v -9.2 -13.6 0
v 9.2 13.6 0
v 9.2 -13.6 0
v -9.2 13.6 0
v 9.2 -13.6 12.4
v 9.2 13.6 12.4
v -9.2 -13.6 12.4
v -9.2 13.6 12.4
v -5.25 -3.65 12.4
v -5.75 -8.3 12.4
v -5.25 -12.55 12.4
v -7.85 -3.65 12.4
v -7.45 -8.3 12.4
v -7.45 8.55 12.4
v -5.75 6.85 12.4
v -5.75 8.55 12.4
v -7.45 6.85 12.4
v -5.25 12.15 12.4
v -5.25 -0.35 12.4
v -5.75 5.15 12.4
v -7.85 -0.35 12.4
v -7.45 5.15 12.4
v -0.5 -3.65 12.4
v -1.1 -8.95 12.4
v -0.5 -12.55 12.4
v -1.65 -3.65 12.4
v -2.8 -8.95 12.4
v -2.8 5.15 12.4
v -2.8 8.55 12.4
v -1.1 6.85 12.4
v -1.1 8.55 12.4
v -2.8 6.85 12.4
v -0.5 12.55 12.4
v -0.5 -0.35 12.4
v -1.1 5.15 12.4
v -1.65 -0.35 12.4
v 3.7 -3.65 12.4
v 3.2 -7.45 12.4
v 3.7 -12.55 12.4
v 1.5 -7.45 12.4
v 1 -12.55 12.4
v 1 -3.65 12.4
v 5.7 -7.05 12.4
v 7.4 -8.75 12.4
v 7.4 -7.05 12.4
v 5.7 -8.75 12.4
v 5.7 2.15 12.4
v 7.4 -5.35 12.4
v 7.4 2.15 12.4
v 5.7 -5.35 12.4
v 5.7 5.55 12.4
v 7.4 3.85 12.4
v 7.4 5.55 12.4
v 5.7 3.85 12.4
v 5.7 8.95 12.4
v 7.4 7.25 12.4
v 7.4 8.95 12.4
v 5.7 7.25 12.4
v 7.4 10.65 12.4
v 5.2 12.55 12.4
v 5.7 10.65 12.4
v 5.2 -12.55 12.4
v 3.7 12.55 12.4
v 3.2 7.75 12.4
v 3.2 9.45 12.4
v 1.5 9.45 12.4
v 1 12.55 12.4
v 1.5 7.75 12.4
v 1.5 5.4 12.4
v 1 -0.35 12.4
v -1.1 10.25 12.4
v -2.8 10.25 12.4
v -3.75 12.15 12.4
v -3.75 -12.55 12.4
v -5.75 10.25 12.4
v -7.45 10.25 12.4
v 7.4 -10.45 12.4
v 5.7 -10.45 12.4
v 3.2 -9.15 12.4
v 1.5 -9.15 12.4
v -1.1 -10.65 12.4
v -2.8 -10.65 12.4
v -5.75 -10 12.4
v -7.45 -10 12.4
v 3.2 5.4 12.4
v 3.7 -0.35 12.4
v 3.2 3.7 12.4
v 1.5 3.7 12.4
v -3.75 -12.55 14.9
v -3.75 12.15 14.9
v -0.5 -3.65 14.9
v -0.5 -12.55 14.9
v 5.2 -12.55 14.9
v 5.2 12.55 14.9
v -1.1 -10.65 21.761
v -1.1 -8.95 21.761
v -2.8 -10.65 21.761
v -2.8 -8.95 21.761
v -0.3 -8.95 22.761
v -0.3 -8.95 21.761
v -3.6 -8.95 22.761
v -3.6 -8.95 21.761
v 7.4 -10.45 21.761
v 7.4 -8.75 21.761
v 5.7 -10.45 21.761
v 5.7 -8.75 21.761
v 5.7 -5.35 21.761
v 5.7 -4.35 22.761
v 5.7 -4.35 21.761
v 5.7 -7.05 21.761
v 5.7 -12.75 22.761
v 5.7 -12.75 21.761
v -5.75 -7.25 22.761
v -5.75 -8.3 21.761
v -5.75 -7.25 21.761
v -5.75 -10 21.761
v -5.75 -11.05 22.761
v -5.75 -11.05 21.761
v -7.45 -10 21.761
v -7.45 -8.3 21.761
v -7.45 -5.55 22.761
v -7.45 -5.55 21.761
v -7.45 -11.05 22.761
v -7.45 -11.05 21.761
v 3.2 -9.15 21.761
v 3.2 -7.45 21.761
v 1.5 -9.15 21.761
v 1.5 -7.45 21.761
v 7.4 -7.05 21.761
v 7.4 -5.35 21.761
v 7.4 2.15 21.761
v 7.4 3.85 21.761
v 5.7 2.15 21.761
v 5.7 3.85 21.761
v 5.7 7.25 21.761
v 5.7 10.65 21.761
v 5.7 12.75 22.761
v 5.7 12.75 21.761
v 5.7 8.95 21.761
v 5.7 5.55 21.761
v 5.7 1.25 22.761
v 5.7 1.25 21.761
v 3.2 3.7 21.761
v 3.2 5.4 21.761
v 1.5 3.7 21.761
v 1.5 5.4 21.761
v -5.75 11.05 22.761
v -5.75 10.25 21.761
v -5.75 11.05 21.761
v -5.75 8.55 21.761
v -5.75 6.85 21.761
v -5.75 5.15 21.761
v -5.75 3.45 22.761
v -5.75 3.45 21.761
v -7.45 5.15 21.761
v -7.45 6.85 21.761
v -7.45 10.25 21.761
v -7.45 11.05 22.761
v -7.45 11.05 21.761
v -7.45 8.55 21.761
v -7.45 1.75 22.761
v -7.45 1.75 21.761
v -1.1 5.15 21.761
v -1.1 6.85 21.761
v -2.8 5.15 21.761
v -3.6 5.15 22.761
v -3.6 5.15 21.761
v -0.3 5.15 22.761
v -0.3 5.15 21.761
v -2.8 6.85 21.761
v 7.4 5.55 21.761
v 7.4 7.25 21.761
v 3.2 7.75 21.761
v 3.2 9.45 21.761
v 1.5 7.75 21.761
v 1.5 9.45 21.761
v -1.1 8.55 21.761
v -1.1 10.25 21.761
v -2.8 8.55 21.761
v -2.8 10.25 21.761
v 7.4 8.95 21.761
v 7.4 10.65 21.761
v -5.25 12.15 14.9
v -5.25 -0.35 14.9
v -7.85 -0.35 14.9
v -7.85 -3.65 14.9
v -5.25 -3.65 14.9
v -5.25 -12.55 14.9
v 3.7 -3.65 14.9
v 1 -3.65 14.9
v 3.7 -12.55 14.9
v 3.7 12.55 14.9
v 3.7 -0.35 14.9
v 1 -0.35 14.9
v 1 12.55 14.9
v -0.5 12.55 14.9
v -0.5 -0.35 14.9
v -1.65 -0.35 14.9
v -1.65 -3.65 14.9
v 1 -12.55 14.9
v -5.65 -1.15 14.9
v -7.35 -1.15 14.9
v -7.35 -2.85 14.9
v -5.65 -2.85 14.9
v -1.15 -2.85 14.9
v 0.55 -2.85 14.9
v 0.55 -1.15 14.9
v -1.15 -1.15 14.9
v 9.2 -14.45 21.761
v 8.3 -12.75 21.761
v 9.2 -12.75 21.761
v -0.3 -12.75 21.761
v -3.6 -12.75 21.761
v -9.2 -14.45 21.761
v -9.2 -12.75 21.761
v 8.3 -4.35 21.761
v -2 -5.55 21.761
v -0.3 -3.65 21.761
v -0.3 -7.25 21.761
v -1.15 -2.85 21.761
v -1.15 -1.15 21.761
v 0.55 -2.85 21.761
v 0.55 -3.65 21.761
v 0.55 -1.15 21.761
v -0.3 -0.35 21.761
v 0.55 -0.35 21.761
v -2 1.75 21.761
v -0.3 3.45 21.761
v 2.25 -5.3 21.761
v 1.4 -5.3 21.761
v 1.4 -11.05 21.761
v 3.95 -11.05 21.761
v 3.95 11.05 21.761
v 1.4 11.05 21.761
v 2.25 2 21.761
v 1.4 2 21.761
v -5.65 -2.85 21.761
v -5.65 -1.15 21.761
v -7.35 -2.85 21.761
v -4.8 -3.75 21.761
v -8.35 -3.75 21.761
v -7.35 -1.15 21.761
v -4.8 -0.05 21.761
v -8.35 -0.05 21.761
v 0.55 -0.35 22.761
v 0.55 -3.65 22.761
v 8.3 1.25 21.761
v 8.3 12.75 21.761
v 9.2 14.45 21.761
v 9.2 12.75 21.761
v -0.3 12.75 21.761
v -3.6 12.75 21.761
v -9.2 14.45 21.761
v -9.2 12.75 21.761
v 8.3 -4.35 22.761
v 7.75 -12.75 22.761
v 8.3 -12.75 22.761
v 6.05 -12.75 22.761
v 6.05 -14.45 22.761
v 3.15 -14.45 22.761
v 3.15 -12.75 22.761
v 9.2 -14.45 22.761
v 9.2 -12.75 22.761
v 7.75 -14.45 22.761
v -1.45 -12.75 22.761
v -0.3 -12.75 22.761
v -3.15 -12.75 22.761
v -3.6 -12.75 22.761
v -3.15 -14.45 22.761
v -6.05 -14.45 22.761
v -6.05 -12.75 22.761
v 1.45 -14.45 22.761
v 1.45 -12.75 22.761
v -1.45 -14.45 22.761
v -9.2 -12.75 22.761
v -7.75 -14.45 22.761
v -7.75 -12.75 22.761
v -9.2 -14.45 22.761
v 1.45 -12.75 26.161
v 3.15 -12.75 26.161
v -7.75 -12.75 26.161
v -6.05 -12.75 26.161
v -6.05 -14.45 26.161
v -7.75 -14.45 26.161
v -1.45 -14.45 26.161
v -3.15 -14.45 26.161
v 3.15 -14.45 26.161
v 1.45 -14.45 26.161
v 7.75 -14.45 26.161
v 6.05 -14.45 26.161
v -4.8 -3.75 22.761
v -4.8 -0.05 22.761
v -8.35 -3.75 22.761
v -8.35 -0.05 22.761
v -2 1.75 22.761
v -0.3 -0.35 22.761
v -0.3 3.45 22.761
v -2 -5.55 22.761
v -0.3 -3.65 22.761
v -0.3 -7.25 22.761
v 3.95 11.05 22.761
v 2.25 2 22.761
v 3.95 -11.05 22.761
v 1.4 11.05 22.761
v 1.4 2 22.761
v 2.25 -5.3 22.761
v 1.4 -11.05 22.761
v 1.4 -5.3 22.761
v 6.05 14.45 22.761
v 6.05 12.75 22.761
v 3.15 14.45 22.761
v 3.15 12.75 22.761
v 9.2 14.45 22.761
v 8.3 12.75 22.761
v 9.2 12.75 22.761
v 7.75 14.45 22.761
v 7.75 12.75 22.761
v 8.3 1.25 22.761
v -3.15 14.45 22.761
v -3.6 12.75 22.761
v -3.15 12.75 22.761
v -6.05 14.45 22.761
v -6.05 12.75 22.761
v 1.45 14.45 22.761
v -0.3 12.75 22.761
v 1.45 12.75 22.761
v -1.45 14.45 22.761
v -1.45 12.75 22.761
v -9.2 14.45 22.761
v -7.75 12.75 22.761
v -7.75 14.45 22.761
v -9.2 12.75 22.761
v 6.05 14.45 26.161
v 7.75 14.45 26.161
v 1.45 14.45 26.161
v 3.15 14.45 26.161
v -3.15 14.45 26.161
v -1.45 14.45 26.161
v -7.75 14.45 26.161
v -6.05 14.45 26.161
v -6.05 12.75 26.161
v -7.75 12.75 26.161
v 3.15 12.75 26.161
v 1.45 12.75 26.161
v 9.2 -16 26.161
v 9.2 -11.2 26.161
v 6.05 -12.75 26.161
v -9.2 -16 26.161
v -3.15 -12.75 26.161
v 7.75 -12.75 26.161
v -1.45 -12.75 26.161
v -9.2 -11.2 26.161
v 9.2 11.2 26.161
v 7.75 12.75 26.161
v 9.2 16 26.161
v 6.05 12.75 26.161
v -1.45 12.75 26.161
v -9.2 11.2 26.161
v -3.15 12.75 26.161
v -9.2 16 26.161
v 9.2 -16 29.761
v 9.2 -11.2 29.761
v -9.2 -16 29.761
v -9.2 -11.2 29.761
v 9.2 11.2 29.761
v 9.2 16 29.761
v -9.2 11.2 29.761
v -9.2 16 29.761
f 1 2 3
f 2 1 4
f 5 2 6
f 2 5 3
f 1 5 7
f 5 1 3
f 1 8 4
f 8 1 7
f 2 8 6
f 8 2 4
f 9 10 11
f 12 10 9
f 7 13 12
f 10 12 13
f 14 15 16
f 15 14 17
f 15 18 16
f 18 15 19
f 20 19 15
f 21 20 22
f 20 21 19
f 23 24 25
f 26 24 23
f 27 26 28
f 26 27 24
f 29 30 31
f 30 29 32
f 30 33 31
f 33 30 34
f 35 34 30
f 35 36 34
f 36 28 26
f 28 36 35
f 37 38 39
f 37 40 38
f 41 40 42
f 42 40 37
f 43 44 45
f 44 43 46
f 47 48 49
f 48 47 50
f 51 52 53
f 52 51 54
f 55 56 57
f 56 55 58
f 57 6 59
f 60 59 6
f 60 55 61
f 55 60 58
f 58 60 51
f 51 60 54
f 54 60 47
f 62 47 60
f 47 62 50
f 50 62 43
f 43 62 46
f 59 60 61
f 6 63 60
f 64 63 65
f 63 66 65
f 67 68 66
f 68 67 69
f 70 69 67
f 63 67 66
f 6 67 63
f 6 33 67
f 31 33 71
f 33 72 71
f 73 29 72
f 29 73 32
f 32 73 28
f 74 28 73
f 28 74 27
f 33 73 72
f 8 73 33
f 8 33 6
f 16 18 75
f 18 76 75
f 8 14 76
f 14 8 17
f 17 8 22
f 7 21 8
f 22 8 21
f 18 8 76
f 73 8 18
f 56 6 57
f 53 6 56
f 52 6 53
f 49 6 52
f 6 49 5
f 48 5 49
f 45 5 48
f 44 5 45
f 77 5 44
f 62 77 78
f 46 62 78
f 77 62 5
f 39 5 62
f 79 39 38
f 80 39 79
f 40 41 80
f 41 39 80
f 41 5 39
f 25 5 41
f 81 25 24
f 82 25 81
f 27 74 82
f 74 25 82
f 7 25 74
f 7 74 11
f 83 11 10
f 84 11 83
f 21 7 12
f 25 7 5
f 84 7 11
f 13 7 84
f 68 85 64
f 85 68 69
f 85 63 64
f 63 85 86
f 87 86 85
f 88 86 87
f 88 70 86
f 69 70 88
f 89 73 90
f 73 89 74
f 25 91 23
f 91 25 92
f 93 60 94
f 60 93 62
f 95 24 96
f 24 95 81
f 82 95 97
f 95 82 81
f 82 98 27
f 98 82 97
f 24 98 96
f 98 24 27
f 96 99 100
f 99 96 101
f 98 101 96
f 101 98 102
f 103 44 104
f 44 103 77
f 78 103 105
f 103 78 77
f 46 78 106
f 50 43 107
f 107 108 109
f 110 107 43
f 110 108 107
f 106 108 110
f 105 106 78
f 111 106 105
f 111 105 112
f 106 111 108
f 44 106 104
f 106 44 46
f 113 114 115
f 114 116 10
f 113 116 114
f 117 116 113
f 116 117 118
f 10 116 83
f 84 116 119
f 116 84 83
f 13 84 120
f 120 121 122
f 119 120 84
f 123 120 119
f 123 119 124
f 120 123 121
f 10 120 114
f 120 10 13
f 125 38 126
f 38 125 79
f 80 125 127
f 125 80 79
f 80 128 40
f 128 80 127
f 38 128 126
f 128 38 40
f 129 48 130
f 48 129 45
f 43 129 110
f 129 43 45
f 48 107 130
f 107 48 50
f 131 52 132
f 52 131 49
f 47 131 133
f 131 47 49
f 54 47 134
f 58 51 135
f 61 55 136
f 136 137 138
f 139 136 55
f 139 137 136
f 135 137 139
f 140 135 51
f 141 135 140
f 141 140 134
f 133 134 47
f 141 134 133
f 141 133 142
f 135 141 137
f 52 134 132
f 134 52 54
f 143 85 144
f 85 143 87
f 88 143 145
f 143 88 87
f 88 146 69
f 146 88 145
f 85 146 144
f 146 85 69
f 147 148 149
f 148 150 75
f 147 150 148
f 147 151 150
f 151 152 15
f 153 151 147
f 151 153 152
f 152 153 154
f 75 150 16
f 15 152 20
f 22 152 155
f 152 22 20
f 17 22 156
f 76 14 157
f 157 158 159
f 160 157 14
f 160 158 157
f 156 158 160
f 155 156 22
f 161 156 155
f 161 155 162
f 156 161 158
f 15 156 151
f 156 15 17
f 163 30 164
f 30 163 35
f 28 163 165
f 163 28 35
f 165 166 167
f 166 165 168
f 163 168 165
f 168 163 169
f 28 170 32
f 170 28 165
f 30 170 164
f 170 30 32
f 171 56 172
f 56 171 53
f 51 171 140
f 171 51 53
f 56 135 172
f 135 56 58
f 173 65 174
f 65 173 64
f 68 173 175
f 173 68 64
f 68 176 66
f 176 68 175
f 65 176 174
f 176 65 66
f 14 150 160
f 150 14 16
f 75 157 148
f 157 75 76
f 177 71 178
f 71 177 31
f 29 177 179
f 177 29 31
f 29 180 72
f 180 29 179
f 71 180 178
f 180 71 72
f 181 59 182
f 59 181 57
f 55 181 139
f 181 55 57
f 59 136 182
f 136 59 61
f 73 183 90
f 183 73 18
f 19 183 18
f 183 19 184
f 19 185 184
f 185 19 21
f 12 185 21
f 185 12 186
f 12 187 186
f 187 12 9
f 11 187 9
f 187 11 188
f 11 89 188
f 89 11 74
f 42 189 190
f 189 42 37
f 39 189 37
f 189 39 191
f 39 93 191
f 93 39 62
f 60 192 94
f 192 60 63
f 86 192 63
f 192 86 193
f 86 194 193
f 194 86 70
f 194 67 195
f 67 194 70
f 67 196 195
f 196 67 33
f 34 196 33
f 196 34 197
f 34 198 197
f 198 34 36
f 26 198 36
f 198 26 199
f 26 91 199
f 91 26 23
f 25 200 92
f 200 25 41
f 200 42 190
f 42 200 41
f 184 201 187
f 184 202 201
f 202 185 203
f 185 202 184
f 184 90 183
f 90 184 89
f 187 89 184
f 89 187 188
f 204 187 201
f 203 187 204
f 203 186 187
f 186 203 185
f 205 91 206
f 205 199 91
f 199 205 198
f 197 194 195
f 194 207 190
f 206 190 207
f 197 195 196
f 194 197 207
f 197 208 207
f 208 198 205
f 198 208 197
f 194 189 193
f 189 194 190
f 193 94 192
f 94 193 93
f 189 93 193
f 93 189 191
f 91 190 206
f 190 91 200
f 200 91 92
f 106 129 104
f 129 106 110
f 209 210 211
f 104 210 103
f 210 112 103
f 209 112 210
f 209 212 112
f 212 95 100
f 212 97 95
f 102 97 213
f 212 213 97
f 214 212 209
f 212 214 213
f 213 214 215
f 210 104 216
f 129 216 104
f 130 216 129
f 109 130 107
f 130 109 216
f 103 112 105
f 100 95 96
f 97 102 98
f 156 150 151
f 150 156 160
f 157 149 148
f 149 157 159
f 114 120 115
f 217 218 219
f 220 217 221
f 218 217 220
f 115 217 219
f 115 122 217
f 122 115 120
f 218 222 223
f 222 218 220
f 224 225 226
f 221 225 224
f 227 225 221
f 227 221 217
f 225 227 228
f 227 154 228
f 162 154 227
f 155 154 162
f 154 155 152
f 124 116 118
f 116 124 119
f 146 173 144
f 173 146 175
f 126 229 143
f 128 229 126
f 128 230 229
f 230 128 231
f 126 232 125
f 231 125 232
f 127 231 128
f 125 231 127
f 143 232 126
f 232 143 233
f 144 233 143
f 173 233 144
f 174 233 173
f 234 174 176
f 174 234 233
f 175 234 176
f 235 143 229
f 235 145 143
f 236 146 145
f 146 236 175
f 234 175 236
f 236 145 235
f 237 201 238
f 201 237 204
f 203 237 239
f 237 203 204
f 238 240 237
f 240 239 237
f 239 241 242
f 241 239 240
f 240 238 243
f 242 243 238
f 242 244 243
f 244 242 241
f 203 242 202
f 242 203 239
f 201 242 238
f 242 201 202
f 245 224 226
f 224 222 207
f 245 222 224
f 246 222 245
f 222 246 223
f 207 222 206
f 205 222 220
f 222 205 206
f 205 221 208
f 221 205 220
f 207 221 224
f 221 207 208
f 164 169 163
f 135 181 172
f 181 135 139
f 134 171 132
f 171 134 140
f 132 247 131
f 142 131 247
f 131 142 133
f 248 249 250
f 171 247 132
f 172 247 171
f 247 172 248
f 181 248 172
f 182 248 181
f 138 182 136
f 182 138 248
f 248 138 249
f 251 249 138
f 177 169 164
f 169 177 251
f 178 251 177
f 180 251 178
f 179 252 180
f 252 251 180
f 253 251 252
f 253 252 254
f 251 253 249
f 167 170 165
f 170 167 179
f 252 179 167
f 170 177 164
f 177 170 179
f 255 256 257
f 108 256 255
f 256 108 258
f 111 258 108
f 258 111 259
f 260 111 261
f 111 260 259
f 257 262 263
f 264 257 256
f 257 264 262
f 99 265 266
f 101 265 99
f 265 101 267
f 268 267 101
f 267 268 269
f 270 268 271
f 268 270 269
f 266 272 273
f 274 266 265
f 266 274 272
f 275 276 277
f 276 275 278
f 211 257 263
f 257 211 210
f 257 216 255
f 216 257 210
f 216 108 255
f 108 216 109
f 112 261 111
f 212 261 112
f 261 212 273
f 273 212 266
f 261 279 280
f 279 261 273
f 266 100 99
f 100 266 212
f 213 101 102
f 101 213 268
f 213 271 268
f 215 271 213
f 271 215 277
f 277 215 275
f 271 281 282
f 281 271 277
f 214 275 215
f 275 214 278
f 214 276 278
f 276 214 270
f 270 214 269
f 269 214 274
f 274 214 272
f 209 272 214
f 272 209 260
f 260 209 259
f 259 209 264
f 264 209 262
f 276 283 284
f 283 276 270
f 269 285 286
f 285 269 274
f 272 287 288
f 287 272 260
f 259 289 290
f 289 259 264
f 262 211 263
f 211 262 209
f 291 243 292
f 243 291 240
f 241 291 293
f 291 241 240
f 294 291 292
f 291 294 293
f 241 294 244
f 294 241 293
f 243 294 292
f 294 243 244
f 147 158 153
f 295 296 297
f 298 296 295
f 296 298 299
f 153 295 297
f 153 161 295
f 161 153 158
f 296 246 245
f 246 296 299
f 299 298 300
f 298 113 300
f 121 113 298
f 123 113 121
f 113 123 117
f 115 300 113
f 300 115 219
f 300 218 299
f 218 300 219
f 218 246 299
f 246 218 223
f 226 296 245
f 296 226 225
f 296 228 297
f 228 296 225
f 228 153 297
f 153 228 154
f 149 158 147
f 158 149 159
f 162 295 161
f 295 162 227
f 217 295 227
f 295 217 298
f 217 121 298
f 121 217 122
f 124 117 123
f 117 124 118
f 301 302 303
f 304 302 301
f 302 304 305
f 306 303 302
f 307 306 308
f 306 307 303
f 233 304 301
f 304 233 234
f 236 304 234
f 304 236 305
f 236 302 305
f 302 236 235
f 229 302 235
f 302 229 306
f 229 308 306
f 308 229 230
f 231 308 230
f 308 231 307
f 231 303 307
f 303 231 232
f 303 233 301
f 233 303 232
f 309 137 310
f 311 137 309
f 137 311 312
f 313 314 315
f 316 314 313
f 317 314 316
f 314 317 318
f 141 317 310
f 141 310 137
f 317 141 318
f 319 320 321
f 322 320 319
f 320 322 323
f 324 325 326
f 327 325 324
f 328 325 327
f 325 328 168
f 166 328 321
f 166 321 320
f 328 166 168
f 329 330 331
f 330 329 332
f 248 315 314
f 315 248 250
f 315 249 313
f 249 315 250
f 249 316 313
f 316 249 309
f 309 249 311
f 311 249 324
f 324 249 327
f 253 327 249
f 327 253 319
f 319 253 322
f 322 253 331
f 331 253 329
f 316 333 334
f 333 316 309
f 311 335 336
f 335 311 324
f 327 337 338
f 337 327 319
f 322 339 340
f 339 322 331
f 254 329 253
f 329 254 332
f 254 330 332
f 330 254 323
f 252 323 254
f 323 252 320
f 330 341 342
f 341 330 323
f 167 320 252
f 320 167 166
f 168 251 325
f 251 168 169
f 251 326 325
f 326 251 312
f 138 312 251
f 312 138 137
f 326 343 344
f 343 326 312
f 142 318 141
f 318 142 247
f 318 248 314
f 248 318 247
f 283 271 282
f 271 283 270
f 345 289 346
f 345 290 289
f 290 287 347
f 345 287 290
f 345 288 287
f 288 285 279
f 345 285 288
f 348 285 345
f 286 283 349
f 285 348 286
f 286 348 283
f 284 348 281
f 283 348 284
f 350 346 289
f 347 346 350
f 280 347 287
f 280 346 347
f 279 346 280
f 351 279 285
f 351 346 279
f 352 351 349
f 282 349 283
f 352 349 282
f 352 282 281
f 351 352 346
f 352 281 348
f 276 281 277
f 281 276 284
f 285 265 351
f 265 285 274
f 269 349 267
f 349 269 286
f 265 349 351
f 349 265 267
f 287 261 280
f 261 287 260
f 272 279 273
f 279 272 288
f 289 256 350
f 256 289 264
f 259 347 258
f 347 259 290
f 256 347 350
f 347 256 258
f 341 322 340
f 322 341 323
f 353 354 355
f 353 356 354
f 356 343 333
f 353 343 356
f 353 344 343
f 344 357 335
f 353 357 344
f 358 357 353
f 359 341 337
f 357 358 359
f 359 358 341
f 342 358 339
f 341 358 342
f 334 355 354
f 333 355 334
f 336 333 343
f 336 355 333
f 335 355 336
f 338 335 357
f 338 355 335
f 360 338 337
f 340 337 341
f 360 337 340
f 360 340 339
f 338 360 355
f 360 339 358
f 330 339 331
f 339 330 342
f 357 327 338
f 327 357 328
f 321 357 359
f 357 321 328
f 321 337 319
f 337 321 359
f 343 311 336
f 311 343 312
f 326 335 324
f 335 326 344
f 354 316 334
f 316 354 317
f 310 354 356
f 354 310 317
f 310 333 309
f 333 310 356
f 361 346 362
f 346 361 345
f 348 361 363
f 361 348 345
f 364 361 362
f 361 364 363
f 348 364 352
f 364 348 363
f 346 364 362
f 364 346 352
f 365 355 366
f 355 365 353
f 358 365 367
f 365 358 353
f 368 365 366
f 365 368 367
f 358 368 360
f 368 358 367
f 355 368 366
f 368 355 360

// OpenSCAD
// Generated by SolidPython 0.4.2 on 2020-09-29 23:20:15
//!OpenSCAD

scale(v = 0.0100000000) {
	translate(v = [-920, -1360, 0]) {
		union() {
			color(c = [0.4000000000, 0.4000000000, 0.4000000000]) {
				translate(v = [0, 0, 0]) {
					linear_extrude(height = 1000.0000000000) {
						polygon(paths = [[0, 1, 2, 3]], points = [[0, 0], [0, 2720], [1840, 2720], [1840, 0]]);
					}
				}
			}
			color(c = [0.2000000000, 0.6000000000, 0.2000000000]) {
				translate(v = [0, 0, 1000.0000000000]) {
					linear_extrude(height = 120.0000000000) {
						polygon(paths = [[0, 1, 2, 3]], points = [[0, 1305], [0, 2720], [1840, 2720], [1840, 1305]]);
					}
				}
			}
			color(c = [0.4000000000, 0.4000000000, 0.4000000000]) {
				translate(v = [0, 0, 1000.0000000000]) {
					linear_extrude(height = 120.0000000000) {
						polygon(paths = [[0, 1, 2, 3]], points = [[0, 0], [0, 1305], [1840, 1305], [1840, 0]]);
					}
				}
			}
			color(c = [0.9000000000, 0.6000000000, 0.6000000000]) {
				translate(v = [0, 0, 1120.0000000000]) {
					linear_extrude(height = 120.0000000000) {
						polygon(paths = [[0, 1, 2, 3]], points = [[135, 1805], [135, 2445], [395, 2445], [395, 1805]]);
					}
				}
			}
			color(c = [0.9000000000, 0.6000000000, 0.6000000000]) {
				translate(v = [0, 0, 1120.0000000000]) {
					linear_extrude(height = 120.0000000000) {
						polygon(paths = [[0, 1, 2, 3, 4, 5, 6, 7]], points = [[620, 1485], [620, 1805], [545, 1805], [545, 2445], [620, 2445], [620, 2485], [870, 2485], [870, 1485]]);
					}
				}
			}
			color(c = [0.9000000000, 0.6000000000, 0.6000000000]) {
				translate(v = [0, 0, 1120.0000000000]) {
					linear_extrude(height = 120.0000000000) {
						polygon(paths = [[0, 1, 2, 3]], points = [[1020, 1485], [1020, 2485], [1290, 2485], [1290, 1485]]);
					}
				}
			}
			color(c = [0.9000000000, 0.6000000000, 0.6000000000]) {
				translate(v = [0, 0, 1120.0000000000]) {
					linear_extrude(height = 120.0000000000) {
						polygon(paths = [[0, 1, 2, 3]], points = [[1440, 1485], [1440, 2485], [1705, 2485], [1705, 1485]]);
					}
				}
			}
			color(c = [0.9000000000, 0.6000000000, 0.9000000000]) {
				translate(v = [0, 0, 1120.0000000000]) {
					linear_extrude(height = 120.0000000000) {
						polygon(paths = [[0, 1, 2, 3]], points = [[135, 235], [135, 655], [395, 655], [395, 235]]);
					}
				}
			}
			color(c = [0.9000000000, 0.6000000000, 0.9000000000]) {
				translate(v = [0, 0, 1120.0000000000]) {
					linear_extrude(height = 120.0000000000) {
						polygon(paths = [[0, 1, 2, 3, 4, 5]], points = [[545, 235], [545, 655], [620, 655], [620, 885], [870, 885], [870, 235]]);
					}
				}
			}
			color(c = [0.9000000000, 0.6000000000, 0.9000000000]) {
				translate(v = [0, 0, 1120.0000000000]) {
					linear_extrude(height = 120.0000000000) {
						polygon(paths = [[0, 1, 2, 3]], points = [[1020, 235], [1020, 885], [1290, 885], [1290, 235]]);
					}
				}
			}
			color(c = [0.9000000000, 0.6000000000, 0.9000000000]) {
				translate(v = [0, 0, 1120.0000000000]) {
					linear_extrude(height = 120.0000000000) {
						polygon(paths = [[0, 1, 2, 3]], points = [[1440, 235], [1440, 885], [1705, 885], [1705, 235]]);
					}
				}
			}
			color(c = [0.2000000000, 0.6000000000, 0.2000000000]) {
				translate(v = [0, 0, 1120.0000000000]) {
					linear_extrude(height = 120.0000000000) {
						difference() {
							polygon(paths = [[0, 1, 2, 3]], points = [[0, 1305], [0, 2720], [1840, 2720], [1840, 1305]]);
							polygon(paths = [[0, 1, 2, 3]], points = [[1020, 1485], [1290, 1485], [1290, 2485], [1020, 2485]]);
							polygon(paths = [[0, 1, 2, 3]], points = [[1440, 1485], [1705, 1485], [1705, 2485], [1440, 2485]]);
							polygon(paths = [[0, 1, 2, 3]], points = [[135, 1805], [395, 1805], [395, 2445], [135, 2445]]);
							polygon(paths = [[0, 1, 2, 3, 4, 5, 6, 7]], points = [[620, 1485], [870, 1485], [870, 2485], [620, 2485], [620, 2445], [545, 2445], [545, 1805], [620, 1805]]);
						}
					}
				}
			}
			color(c = [0.4000000000, 0.4000000000, 0.4000000000]) {
				translate(v = [0, 0, 1120.0000000000]) {
					linear_extrude(height = 120.0000000000) {
						difference() {
							polygon(paths = [[0, 1, 2, 3]], points = [[0, 0], [0, 1305], [1840, 1305], [1840, 0]]);
							polygon(paths = [[0, 1, 2, 3]], points = [[135, 235], [395, 235], [395, 655], [135, 655]]);
							polygon(paths = [[0, 1, 2, 3]], points = [[1020, 235], [1290, 235], [1290, 885], [1020, 885]]);
							polygon(paths = [[0, 1, 2, 3]], points = [[1440, 235], [1705, 235], [1705, 885], [1440, 885]]);
							polygon(paths = [[0, 1, 2, 3, 4, 5]], points = [[545, 235], [870, 235], [870, 885], [620, 885], [620, 655], [545, 655]]);
						}
					}
				}
			}
			color(c = [0.1000000000, 0.1000000000, 0.1000000000]) {
				translate(v = [0, 0, 1240.0000000000]) {
					linear_extrude(height = 70.0000000000) {
						polygon(paths = [[0, 1, 2, 3]], points = [[640, 295], [640, 465], [810, 465], [810, 295]]);
					}
				}
			}
			color(c = [0.1000000000, 0.1000000000, 0.1000000000]) {
				translate(v = [0, 0, 1240.0000000000]) {
					linear_extrude(height = 70.0000000000) {
						polygon(paths = [[0, 1, 2, 3]], points = [[1490, 315], [1490, 485], [1660, 485], [1660, 315]]);
					}
				}
			}
			color(c = [0.1000000000, 0.1000000000, 0.1000000000]) {
				translate(v = [0, 0, 1240.0000000000]) {
					linear_extrude(height = 70.0000000000) {
						polygon(paths = [[0, 1, 2, 3]], points = [[175, 360], [175, 530], [345, 530], [345, 360]]);
					}
				}
			}
			color(c = [0.1000000000, 0.1000000000, 0.1000000000]) {
				translate(v = [0, 0, 1240.0000000000]) {
					linear_extrude(height = 70.0000000000) {
						polygon(paths = [[0, 1, 2, 3]], points = [[1070, 445], [1070, 615], [1240, 615], [1240, 445]]);
					}
				}
			}
			color(c = [0.1000000000, 0.1000000000, 0.1000000000]) {
				translate(v = [0, 0, 1240.0000000000]) {
					linear_extrude(height = 70.0000000000) {
						polygon(paths = [[0, 1, 2, 3]], points = [[1490, 655], [1490, 825], [1660, 825], [1660, 655]]);
					}
				}
			}
			color(c = [0.1000000000, 0.1000000000, 0.1000000000]) {
				translate(v = [0, 0, 1240.0000000000]) {
					linear_extrude(height = 70.0000000000) {
						polygon(paths = [[0, 1, 2, 3]], points = [[1490, 1575], [1490, 1745], [1660, 1745], [1660, 1575]]);
					}
				}
			}
			color(c = [0.1000000000, 0.1000000000, 0.1000000000]) {
				translate(v = [0, 0, 1240.0000000000]) {
					linear_extrude(height = 70.0000000000) {
						polygon(paths = [[0, 1, 2, 3]], points = [[1070, 1730], [1070, 1900], [1240, 1900], [1240, 1730]]);
					}
				}
			}
			color(c = [0.1000000000, 0.1000000000, 0.1000000000]) {
				translate(v = [0, 0, 1240.0000000000]) {
					linear_extrude(height = 70.0000000000) {
						polygon(paths = [[0, 1, 2, 3]], points = [[175, 1875], [175, 2045], [345, 2045], [345, 1875]]);
					}
				}
			}
			color(c = [0.1000000000, 0.1000000000, 0.1000000000]) {
				translate(v = [0, 0, 1240.0000000000]) {
					linear_extrude(height = 70.0000000000) {
						polygon(paths = [[0, 1, 2, 3]], points = [[640, 1875], [640, 2045], [810, 2045], [810, 1875]]);
					}
				}
			}
			color(c = [0.1000000000, 0.1000000000, 0.1000000000]) {
				translate(v = [0, 0, 1240.0000000000]) {
					linear_extrude(height = 70.0000000000) {
						polygon(paths = [[0, 1, 2, 3]], points = [[1490, 1915], [1490, 2085], [1660, 2085], [1660, 1915]]);
					}
				}
			}
			color(c = [0.1000000000, 0.1000000000, 0.1000000000]) {
				translate(v = [0, 0, 1240.0000000000]) {
					linear_extrude(height = 70.0000000000) {
						polygon(paths = [[0, 1, 2, 3]], points = [[1070, 2135], [1070, 2305], [1240, 2305], [1240, 2135]]);
					}
				}
			}
			color(c = [0.1000000000, 0.1000000000, 0.1000000000]) {
				translate(v = [0, 0, 1240.0000000000]) {
					linear_extrude(height = 70.0000000000) {
						polygon(paths = [[0, 1, 2, 3]], points = [[175, 2215], [175, 2385], [345, 2385], [345, 2215]]);
					}
				}
			}
			color(c = [0.1000000000, 0.1000000000, 0.1000000000]) {
				translate(v = [0, 0, 1240.0000000000]) {
					linear_extrude(height = 70.0000000000) {
						polygon(paths = [[0, 1, 2, 3]], points = [[640, 2215], [640, 2385], [810, 2385], [810, 2215]]);
					}
				}
			}
			color(c = [0.1000000000, 0.1000000000, 0.1000000000]) {
				translate(v = [0, 0, 1240.0000000000]) {
					linear_extrude(height = 70.0000000000) {
						polygon(paths = [[0, 1, 2, 3]], points = [[1490, 2255], [1490, 2425], [1660, 2425], [1660, 2255]]);
					}
				}
			}
			color(c = [1.0000000000, 1.0000000000, 1.0000000000]) {
				translate(v = [0, 0, 1240.0000000000]) {
					linear_extrude(height = 70.0000000000) {
						polygon(paths = [[0, 1, 2, 3, 4, 5, 6, 7]], points = [[395, 105], [395, 995], [135, 995], [135, 1325], [395, 1325], [395, 2575], [545, 2575], [545, 105]]);
					}
				}
			}
			color(c = [1.0000000000, 1.0000000000, 1.0000000000]) {
				translate(v = [0, 0, 1240.0000000000]) {
					linear_extrude(height = 70.0000000000) {
						polygon(paths = [[0, 1, 2, 3, 4, 5, 6, 7, 8, 9, 10, 11, 12, 13, 14, 15]], points = [[870, 105], [870, 995], [755, 995], [755, 1325], [870, 1325], [870, 2615], [1020, 2615], [1020, 1325], [1290, 1325], [1290, 2615], [1440, 2615], [1440, 105], [1290, 105], [1290, 995], [1020, 995], [1020, 105]]);
					}
				}
			}
			color(c = [0.1000000000, 0.1000000000, 0.1000000000]) {
				translate(v = [0, 0, 1310.0000000000]) {
					linear_extrude(height = 180.0000000000) {
						polygon(paths = [[0, 1, 2, 3]], points = [[640, 295], [640, 465], [810, 465], [810, 295]]);
					}
				}
			}
			color(c = [0.1000000000, 0.1000000000, 0.1000000000]) {
				translate(v = [0, 0, 1310.0000000000]) {
					linear_extrude(height = 180.0000000000) {
						polygon(paths = [[0, 1, 2, 3]], points = [[1490, 315], [1490, 485], [1660, 485], [1660, 315]]);
					}
				}
			}
			color(c = [0.1000000000, 0.1000000000, 0.1000000000]) {
				translate(v = [0, 0, 1310.0000000000]) {
					linear_extrude(height = 180.0000000000) {
						polygon(paths = [[0, 1, 2, 3]], points = [[175, 360], [175, 530], [345, 530], [345, 360]]);
					}
				}
			}
			color(c = [0.1000000000, 0.1000000000, 0.1000000000]) {
				translate(v = [0, 0, 1310.0000000000]) {
					linear_extrude(height = 180.0000000000) {
						polygon(paths = [[0, 1, 2, 3]], points = [[1070, 445], [1070, 615], [1240, 615], [1240, 445]]);
					}
				}
			}
			color(c = [0.1000000000, 0.1000000000, 0.1000000000]) {
				translate(v = [0, 0, 1310.0000000000]) {
					linear_extrude(height = 180.0000000000) {
						polygon(paths = [[0, 1, 2, 3]], points = [[1490, 655], [1490, 825], [1660, 825], [1660, 655]]);
					}
				}
			}
			color(c = [0.1000000000, 0.1000000000, 0.1000000000]) {
				translate(v = [0, 0, 1310.0000000000]) {
					linear_extrude(height = 180.0000000000) {
						polygon(paths = [[0, 1, 2, 3]], points = [[1490, 1575], [1490, 1745], [1660, 1745], [1660, 1575]]);
					}
				}
			}
			color(c = [0.1000000000, 0.1000000000, 0.1000000000]) {
				translate(v = [0, 0, 1310.0000000000]) {
					linear_extrude(height = 180.0000000000) {
						polygon(paths = [[0, 1, 2, 3]], points = [[1070, 1730], [1070, 1900], [1240, 1900], [1240, 1730]]);
					}
				}
			}
			color(c = [0.1000000000, 0.1000000000, 0.1000000000]) {
				translate(v = [0, 0, 1310.0000000000]) {
					linear_extrude(height = 180.0000000000) {
						polygon(paths = [[0, 1, 2, 3]], points = [[175, 1875], [175, 2045], [345, 2045], [345, 1875]]);
					}
				}
			}
			color(c = [0.1000000000, 0.1000000000, 0.1000000000]) {
				translate(v = [0, 0, 1310.0000000000]) {
					linear_extrude(height = 180.0000000000) {
						polygon(paths = [[0, 1, 2, 3]], points = [[640, 1875], [640, 2045], [810, 2045], [810, 1875]]);
					}
				}
			}
			color(c = [0.1000000000, 0.1000000000, 0.1000000000]) {
				translate(v = [0, 0, 1310.0000000000]) {
					linear_extrude(height = 180.0000000000) {
						polygon(paths = [[0, 1, 2, 3]], points = [[1490, 1915], [1490, 2085], [1660, 2085], [1660, 1915]]);
					}
				}
			}
			color(c = [0.1000000000, 0.1000000000, 0.1000000000]) {
				translate(v = [0, 0, 1310.0000000000]) {
					linear_extrude(height = 180.0000000000) {
						polygon(paths = [[0, 1, 2, 3]], points = [[1070, 2135], [1070, 2305], [1240, 2305], [1240, 2135]]);
					}
				}
			}
			color(c = [0.1000000000, 0.1000000000, 0.1000000000]) {
				translate(v = [0, 0, 1310.0000000000]) {
					linear_extrude(height = 180.0000000000) {
						polygon(paths = [[0, 1, 2, 3]], points = [[175, 2215], [175, 2385], [345, 2385], [345, 2215]]);
					}
				}
			}
			color(c = [0.1000000000, 0.1000000000, 0.1000000000]) {
				translate(v = [0, 0, 1310.0000000000]) {
					linear_extrude(height = 180.0000000000) {
						polygon(paths = [[0, 1, 2, 3]], points = [[640, 2215], [640, 2385], [810, 2385], [810, 2215]]);
					}
				}
			}
			color(c = [0.1000000000, 0.1000000000, 0.1000000000]) {
				translate(v = [0, 0, 1310.0000000000]) {
					linear_extrude(height = 180.0000000000) {
						polygon(paths = [[0, 1, 2, 3]], points = [[1490, 2255], [1490, 2425], [1660, 2425], [1660, 2255]]);
					}
				}
			}
			color(c = [0.7000000000, 0, 0]) {
				translate(v = [0, 0, 1310.0000000000]) {
					linear_extrude(height = 180.0000000000) {
						polygon(paths = [[0, 1, 2, 3, 4, 5, 6, 7]], points = [[395, 105], [395, 995], [135, 995], [135, 1325], [395, 1325], [395, 2575], [545, 2575], [545, 105]]);
					}
				}
			}
			color(c = [0.7000000000, 0, 0]) {
				translate(v = [0, 0, 1310.0000000000]) {
					linear_extrude(height = 180.0000000000) {
						polygon(paths = [[0, 1, 2, 3, 4, 5, 6, 7, 8, 9, 10, 11, 12, 13, 14, 15]], points = [[870, 105], [870, 995], [755, 995], [755, 1325], [870, 1325], [870, 2615], [1020, 2615], [1020, 1325], [1290, 1325], [1290, 2615], [1440, 2615], [1440, 105], [1290, 105], [1290, 995], [1020, 995], [1020, 105]]);
					}
				}
			}
			color(c = [0.1000000000, 0.1000000000, 0.1000000000]) {
				translate(v = [0, 0, 1490.0000000000]) {
					linear_extrude(height = 686.1000000000) {
						polygon(paths = [[0, 1, 2, 3]], points = [[640, 295], [640, 465], [810, 465], [810, 295]]);
					}
				}
			}
			color(c = [0.1000000000, 0.1000000000, 0.1000000000]) {
				translate(v = [0, 0, 1490.0000000000]) {
					linear_extrude(height = 686.1000000000) {
						polygon(paths = [[0, 1, 2, 3]], points = [[1490, 315], [1490, 485], [1660, 485], [1660, 315]]);
					}
				}
			}
			color(c = [0.1000000000, 0.1000000000, 0.1000000000]) {
				translate(v = [0, 0, 1490.0000000000]) {
					linear_extrude(height = 686.1000000000) {
						polygon(paths = [[0, 1, 2, 3]], points = [[175, 360], [175, 530], [345, 530], [345, 360]]);
					}
				}
			}
			color(c = [0.1000000000, 0.1000000000, 0.1000000000]) {
				translate(v = [0, 0, 1490.0000000000]) {
					linear_extrude(height = 686.1000000000) {
						polygon(paths = [[0, 1, 2, 3]], points = [[1070, 445], [1070, 615], [1240, 615], [1240, 445]]);
					}
				}
			}
			color(c = [0.1000000000, 0.1000000000, 0.1000000000]) {
				translate(v = [0, 0, 1490.0000000000]) {
					linear_extrude(height = 686.1000000000) {
						polygon(paths = [[0, 1, 2, 3]], points = [[1490, 655], [1490, 825], [1660, 825], [1660, 655]]);
					}
				}
			}
			color(c = [0.1000000000, 0.1000000000, 0.1000000000]) {
				translate(v = [0, 0, 1490.0000000000]) {
					linear_extrude(height = 686.1000000000) {
						polygon(paths = [[0, 1, 2, 3]], points = [[185, 1075], [185, 1245], [355, 1245], [355, 1075]]);
					}
				}
			}
			color(c = [0.1000000000, 0.1000000000, 0.1000000000]) {
				translate(v = [0, 0, 1490.0000000000]) {
					linear_extrude(height = 686.1000000000) {
						polygon(paths = [[0, 1, 2, 3]], points = [[805, 1075], [805, 1245], [975, 1245], [975, 1075]]);
					}
				}
			}
			color(c = [0.1000000000, 0.1000000000, 0.1000000000]) {
				translate(v = [0, 0, 1490.0000000000]) {
					linear_extrude(height = 686.1000000000) {
						polygon(paths = [[0, 1, 2, 3]], points = [[1490, 1575], [1490, 1745], [1660, 1745], [1660, 1575]]);
					}
				}
			}
			color(c = [0.1000000000, 0.1000000000, 0.1000000000]) {
				translate(v = [0, 0, 1490.0000000000]) {
					linear_extrude(height = 686.1000000000) {
						polygon(paths = [[0, 1, 2, 3]], points = [[1070, 1730], [1070, 1900], [1240, 1900], [1240, 1730]]);
					}
				}
			}
			color(c = [0.1000000000, 0.1000000000, 0.1000000000]) {
				translate(v = [0, 0, 1490.0000000000]) {
					linear_extrude(height = 686.1000000000) {
						polygon(paths = [[0, 1, 2, 3]], points = [[175, 1875], [175, 2045], [345, 2045], [345, 1875]]);
					}
				}
			}
			color(c = [0.1000000000, 0.1000000000, 0.1000000000]) {
				translate(v = [0, 0, 1490.0000000000]) {
					linear_extrude(height = 686.1000000000) {
						polygon(paths = [[0, 1, 2, 3]], points = [[640, 1875], [640, 2045], [810, 2045], [810, 1875]]);
					}
				}
			}
			color(c = [0.1000000000, 0.1000000000, 0.1000000000]) {
				translate(v = [0, 0, 1490.0000000000]) {
					linear_extrude(height = 686.1000000000) {
						polygon(paths = [[0, 1, 2, 3]], points = [[1490, 1915], [1490, 2085], [1660, 2085], [1660, 1915]]);
					}
				}
			}
			color(c = [0.1000000000, 0.1000000000, 0.1000000000]) {
				translate(v = [0, 0, 1490.0000000000]) {
					linear_extrude(height = 686.1000000000) {
						polygon(paths = [[0, 1, 2, 3]], points = [[1070, 2135], [1070, 2305], [1240, 2305], [1240, 2135]]);
					}
				}
			}
			color(c = [0.1000000000, 0.1000000000, 0.1000000000]) {
				translate(v = [0, 0, 1490.0000000000]) {
					linear_extrude(height = 686.1000000000) {
						polygon(paths = [[0, 1, 2, 3]], points = [[175, 2215], [175, 2385], [345, 2385], [345, 2215]]);
					}
				}
			}
			color(c = [0.1000000000, 0.1000000000, 0.1000000000]) {
				translate(v = [0, 0, 1490.0000000000]) {
					linear_extrude(height = 686.1000000000) {
						polygon(paths = [[0, 1, 2, 3]], points = [[640, 2215], [640, 2385], [810, 2385], [810, 2215]]);
					}
				}
			}
			color(c = [0.1000000000, 0.1000000000, 0.1000000000]) {
				translate(v = [0, 0, 1490.0000000000]) {
					linear_extrude(height = 686.1000000000) {
						polygon(paths = [[0, 1, 2, 3]], points = [[1490, 2255], [1490, 2425], [1660, 2425], [1660, 2255]]);
					}
				}
			}
			color(c = [0.9000000000, 0.6000000000, 0.6000000000]) {
				translate(v = [0, 0, 2176.1000000000]) {
					linear_extrude(height = 100.0000000000) {
						polygon(paths = [[0, 1, 2, 3, 4, 5, 6, 7, 8, 9, 10, 11]], points = [[0, -85], [0, 85], [560, 85], [560, 465], [890, 465], [890, 85], [1490, 85], [1490, 925], [1750, 925], [1750, 85], [1840, 85], [1840, -85]]);
					}
				}
			}
			color(c = [0.9000000000, 0.6000000000, 0.6000000000]) {
				translate(v = [0, 0, 2176.1000000000]) {
					linear_extrude(height = 100.0000000000) {
						polygon(paths = [[0, 1, 2, 3]], points = [[85, 985], [85, 1355], [440, 1355], [440, 985]]);
					}
				}
			}
			color(c = [0.9000000000, 0.6000000000, 0.6000000000]) {
				translate(v = [0, 0, 2176.1000000000]) {
					linear_extrude(height = 100.0000000000) {
						polygon(paths = [[0, 1, 2, 3, 4, 5, 6, 7, 8, 9, 10, 11, 12, 13, 14, 15]], points = [[175, 255], [175, 805], [720, 805], [720, 1535], [175, 1535], [175, 2465], [345, 2465], [345, 1705], [890, 1705], [890, 1325], [975, 1325], [975, 995], [890, 995], [890, 635], [345, 635], [345, 255]]);
					}
				}
			}
			color(c = [0.9000000000, 0.6000000000, 0.6000000000]) {
				translate(v = [0, 0, 2176.1000000000]) {
					linear_extrude(height = 100.0000000000) {
						polygon(paths = [[0, 1, 2, 3, 4, 5, 6, 7]], points = [[1060, 255], [1060, 830], [1145, 830], [1145, 1560], [1060, 1560], [1060, 2465], [1315, 2465], [1315, 255]]);
					}
				}
			}
			color(c = [0.9000000000, 0.6000000000, 0.6000000000]) {
				translate(v = [0, 0, 2176.1000000000]) {
					linear_extrude(height = 100.0000000000) {
						polygon(paths = [[0, 1, 2, 3, 4, 5, 6, 7, 8, 9, 10, 11]], points = [[1490, 1485], [1490, 2635], [890, 2635], [890, 1875], [560, 1875], [560, 2635], [0, 2635], [0, 2805], [1840, 2805], [1840, 2635], [1750, 2635], [1750, 1485]]);
					}
				}
			}
			color(c = [0.5000000000, 0.5000000000, 0.5000000000]) {
				translate(v = [0, 0, 2276.1000000000]) {
					linear_extrude(height = 340.0000000000) {
						polygon(paths = [[0, 1, 2, 3]], points = [[145, -85], [145, 85], [315, 85], [315, -85]]);
					}
				}
			}
			color(c = [0.5000000000, 0.5000000000, 0.5000000000]) {
				translate(v = [0, 0, 2276.1000000000]) {
					linear_extrude(height = 340.0000000000) {
						polygon(paths = [[0, 1, 2, 3]], points = [[605, -85], [605, 85], [775, 85], [775, -85]]);
					}
				}
			}
			color(c = [0.5000000000, 0.5000000000, 0.5000000000]) {
				translate(v = [0, 0, 2276.1000000000]) {
					linear_extrude(height = 340.0000000000) {
						polygon(paths = [[0, 1, 2, 3]], points = [[1065, -85], [1065, 85], [1235, 85], [1235, -85]]);
					}
				}
			}
			color(c = [0.5000000000, 0.5000000000, 0.5000000000]) {
				translate(v = [0, 0, 2276.1000000000]) {
					linear_extrude(height = 340.0000000000) {
						polygon(paths = [[0, 1, 2, 3]], points = [[1525, -85], [1525, 85], [1695, 85], [1695, -85]]);
					}
				}
			}
			color(c = [0.5000000000, 0.5000000000, 0.5000000000]) {
				translate(v = [0, 0, 2276.1000000000]) {
					linear_extrude(height = 340.0000000000) {
						polygon(paths = [[0, 1, 2, 3]], points = [[145, 2635], [145, 2805], [315, 2805], [315, 2635]]);
					}
				}
			}
			color(c = [0.5000000000, 0.5000000000, 0.5000000000]) {
				translate(v = [0, 0, 2276.1000000000]) {
					linear_extrude(height = 340.0000000000) {
						polygon(paths = [[0, 1, 2, 3]], points = [[605, 2635], [605, 2805], [775, 2805], [775, 2635]]);
					}
				}
			}
			color(c = [0.5000000000, 0.5000000000, 0.5000000000]) {
				translate(v = [0, 0, 2276.1000000000]) {
					linear_extrude(height = 340.0000000000) {
						polygon(paths = [[0, 1, 2, 3]], points = [[1065, 2635], [1065, 2805], [1235, 2805], [1235, 2635]]);
					}
				}
			}
			color(c = [0.5000000000, 0.5000000000, 0.5000000000]) {
				translate(v = [0, 0, 2276.1000000000]) {
					linear_extrude(height = 340.0000000000) {
						polygon(paths = [[0, 1, 2, 3]], points = [[1525, 2635], [1525, 2805], [1695, 2805], [1695, 2635]]);
					}
				}
			}
			color(c = [0.3000000000, 0.3000000000, 1]) {
				translate(v = [0, 0, 2616.1000000000]) {
					linear_extrude(height = 360.0000000000) {
						polygon(paths = [[0, 1, 2, 3]], points = [[0, -240], [0, 240], [1840, 240], [1840, -240]]);
					}
				}
			}
			color(c = [0.3000000000, 0.3000000000, 1]) {
				translate(v = [0, 0, 2616.1000000000]) {
					linear_extrude(height = 360.0000000000) {
						polygon(paths = [[0, 1, 2, 3]], points = [[0, 2480], [0, 2960], [1840, 2960], [1840, 2480]]);
					}
				}
			}
		}
	}
}
